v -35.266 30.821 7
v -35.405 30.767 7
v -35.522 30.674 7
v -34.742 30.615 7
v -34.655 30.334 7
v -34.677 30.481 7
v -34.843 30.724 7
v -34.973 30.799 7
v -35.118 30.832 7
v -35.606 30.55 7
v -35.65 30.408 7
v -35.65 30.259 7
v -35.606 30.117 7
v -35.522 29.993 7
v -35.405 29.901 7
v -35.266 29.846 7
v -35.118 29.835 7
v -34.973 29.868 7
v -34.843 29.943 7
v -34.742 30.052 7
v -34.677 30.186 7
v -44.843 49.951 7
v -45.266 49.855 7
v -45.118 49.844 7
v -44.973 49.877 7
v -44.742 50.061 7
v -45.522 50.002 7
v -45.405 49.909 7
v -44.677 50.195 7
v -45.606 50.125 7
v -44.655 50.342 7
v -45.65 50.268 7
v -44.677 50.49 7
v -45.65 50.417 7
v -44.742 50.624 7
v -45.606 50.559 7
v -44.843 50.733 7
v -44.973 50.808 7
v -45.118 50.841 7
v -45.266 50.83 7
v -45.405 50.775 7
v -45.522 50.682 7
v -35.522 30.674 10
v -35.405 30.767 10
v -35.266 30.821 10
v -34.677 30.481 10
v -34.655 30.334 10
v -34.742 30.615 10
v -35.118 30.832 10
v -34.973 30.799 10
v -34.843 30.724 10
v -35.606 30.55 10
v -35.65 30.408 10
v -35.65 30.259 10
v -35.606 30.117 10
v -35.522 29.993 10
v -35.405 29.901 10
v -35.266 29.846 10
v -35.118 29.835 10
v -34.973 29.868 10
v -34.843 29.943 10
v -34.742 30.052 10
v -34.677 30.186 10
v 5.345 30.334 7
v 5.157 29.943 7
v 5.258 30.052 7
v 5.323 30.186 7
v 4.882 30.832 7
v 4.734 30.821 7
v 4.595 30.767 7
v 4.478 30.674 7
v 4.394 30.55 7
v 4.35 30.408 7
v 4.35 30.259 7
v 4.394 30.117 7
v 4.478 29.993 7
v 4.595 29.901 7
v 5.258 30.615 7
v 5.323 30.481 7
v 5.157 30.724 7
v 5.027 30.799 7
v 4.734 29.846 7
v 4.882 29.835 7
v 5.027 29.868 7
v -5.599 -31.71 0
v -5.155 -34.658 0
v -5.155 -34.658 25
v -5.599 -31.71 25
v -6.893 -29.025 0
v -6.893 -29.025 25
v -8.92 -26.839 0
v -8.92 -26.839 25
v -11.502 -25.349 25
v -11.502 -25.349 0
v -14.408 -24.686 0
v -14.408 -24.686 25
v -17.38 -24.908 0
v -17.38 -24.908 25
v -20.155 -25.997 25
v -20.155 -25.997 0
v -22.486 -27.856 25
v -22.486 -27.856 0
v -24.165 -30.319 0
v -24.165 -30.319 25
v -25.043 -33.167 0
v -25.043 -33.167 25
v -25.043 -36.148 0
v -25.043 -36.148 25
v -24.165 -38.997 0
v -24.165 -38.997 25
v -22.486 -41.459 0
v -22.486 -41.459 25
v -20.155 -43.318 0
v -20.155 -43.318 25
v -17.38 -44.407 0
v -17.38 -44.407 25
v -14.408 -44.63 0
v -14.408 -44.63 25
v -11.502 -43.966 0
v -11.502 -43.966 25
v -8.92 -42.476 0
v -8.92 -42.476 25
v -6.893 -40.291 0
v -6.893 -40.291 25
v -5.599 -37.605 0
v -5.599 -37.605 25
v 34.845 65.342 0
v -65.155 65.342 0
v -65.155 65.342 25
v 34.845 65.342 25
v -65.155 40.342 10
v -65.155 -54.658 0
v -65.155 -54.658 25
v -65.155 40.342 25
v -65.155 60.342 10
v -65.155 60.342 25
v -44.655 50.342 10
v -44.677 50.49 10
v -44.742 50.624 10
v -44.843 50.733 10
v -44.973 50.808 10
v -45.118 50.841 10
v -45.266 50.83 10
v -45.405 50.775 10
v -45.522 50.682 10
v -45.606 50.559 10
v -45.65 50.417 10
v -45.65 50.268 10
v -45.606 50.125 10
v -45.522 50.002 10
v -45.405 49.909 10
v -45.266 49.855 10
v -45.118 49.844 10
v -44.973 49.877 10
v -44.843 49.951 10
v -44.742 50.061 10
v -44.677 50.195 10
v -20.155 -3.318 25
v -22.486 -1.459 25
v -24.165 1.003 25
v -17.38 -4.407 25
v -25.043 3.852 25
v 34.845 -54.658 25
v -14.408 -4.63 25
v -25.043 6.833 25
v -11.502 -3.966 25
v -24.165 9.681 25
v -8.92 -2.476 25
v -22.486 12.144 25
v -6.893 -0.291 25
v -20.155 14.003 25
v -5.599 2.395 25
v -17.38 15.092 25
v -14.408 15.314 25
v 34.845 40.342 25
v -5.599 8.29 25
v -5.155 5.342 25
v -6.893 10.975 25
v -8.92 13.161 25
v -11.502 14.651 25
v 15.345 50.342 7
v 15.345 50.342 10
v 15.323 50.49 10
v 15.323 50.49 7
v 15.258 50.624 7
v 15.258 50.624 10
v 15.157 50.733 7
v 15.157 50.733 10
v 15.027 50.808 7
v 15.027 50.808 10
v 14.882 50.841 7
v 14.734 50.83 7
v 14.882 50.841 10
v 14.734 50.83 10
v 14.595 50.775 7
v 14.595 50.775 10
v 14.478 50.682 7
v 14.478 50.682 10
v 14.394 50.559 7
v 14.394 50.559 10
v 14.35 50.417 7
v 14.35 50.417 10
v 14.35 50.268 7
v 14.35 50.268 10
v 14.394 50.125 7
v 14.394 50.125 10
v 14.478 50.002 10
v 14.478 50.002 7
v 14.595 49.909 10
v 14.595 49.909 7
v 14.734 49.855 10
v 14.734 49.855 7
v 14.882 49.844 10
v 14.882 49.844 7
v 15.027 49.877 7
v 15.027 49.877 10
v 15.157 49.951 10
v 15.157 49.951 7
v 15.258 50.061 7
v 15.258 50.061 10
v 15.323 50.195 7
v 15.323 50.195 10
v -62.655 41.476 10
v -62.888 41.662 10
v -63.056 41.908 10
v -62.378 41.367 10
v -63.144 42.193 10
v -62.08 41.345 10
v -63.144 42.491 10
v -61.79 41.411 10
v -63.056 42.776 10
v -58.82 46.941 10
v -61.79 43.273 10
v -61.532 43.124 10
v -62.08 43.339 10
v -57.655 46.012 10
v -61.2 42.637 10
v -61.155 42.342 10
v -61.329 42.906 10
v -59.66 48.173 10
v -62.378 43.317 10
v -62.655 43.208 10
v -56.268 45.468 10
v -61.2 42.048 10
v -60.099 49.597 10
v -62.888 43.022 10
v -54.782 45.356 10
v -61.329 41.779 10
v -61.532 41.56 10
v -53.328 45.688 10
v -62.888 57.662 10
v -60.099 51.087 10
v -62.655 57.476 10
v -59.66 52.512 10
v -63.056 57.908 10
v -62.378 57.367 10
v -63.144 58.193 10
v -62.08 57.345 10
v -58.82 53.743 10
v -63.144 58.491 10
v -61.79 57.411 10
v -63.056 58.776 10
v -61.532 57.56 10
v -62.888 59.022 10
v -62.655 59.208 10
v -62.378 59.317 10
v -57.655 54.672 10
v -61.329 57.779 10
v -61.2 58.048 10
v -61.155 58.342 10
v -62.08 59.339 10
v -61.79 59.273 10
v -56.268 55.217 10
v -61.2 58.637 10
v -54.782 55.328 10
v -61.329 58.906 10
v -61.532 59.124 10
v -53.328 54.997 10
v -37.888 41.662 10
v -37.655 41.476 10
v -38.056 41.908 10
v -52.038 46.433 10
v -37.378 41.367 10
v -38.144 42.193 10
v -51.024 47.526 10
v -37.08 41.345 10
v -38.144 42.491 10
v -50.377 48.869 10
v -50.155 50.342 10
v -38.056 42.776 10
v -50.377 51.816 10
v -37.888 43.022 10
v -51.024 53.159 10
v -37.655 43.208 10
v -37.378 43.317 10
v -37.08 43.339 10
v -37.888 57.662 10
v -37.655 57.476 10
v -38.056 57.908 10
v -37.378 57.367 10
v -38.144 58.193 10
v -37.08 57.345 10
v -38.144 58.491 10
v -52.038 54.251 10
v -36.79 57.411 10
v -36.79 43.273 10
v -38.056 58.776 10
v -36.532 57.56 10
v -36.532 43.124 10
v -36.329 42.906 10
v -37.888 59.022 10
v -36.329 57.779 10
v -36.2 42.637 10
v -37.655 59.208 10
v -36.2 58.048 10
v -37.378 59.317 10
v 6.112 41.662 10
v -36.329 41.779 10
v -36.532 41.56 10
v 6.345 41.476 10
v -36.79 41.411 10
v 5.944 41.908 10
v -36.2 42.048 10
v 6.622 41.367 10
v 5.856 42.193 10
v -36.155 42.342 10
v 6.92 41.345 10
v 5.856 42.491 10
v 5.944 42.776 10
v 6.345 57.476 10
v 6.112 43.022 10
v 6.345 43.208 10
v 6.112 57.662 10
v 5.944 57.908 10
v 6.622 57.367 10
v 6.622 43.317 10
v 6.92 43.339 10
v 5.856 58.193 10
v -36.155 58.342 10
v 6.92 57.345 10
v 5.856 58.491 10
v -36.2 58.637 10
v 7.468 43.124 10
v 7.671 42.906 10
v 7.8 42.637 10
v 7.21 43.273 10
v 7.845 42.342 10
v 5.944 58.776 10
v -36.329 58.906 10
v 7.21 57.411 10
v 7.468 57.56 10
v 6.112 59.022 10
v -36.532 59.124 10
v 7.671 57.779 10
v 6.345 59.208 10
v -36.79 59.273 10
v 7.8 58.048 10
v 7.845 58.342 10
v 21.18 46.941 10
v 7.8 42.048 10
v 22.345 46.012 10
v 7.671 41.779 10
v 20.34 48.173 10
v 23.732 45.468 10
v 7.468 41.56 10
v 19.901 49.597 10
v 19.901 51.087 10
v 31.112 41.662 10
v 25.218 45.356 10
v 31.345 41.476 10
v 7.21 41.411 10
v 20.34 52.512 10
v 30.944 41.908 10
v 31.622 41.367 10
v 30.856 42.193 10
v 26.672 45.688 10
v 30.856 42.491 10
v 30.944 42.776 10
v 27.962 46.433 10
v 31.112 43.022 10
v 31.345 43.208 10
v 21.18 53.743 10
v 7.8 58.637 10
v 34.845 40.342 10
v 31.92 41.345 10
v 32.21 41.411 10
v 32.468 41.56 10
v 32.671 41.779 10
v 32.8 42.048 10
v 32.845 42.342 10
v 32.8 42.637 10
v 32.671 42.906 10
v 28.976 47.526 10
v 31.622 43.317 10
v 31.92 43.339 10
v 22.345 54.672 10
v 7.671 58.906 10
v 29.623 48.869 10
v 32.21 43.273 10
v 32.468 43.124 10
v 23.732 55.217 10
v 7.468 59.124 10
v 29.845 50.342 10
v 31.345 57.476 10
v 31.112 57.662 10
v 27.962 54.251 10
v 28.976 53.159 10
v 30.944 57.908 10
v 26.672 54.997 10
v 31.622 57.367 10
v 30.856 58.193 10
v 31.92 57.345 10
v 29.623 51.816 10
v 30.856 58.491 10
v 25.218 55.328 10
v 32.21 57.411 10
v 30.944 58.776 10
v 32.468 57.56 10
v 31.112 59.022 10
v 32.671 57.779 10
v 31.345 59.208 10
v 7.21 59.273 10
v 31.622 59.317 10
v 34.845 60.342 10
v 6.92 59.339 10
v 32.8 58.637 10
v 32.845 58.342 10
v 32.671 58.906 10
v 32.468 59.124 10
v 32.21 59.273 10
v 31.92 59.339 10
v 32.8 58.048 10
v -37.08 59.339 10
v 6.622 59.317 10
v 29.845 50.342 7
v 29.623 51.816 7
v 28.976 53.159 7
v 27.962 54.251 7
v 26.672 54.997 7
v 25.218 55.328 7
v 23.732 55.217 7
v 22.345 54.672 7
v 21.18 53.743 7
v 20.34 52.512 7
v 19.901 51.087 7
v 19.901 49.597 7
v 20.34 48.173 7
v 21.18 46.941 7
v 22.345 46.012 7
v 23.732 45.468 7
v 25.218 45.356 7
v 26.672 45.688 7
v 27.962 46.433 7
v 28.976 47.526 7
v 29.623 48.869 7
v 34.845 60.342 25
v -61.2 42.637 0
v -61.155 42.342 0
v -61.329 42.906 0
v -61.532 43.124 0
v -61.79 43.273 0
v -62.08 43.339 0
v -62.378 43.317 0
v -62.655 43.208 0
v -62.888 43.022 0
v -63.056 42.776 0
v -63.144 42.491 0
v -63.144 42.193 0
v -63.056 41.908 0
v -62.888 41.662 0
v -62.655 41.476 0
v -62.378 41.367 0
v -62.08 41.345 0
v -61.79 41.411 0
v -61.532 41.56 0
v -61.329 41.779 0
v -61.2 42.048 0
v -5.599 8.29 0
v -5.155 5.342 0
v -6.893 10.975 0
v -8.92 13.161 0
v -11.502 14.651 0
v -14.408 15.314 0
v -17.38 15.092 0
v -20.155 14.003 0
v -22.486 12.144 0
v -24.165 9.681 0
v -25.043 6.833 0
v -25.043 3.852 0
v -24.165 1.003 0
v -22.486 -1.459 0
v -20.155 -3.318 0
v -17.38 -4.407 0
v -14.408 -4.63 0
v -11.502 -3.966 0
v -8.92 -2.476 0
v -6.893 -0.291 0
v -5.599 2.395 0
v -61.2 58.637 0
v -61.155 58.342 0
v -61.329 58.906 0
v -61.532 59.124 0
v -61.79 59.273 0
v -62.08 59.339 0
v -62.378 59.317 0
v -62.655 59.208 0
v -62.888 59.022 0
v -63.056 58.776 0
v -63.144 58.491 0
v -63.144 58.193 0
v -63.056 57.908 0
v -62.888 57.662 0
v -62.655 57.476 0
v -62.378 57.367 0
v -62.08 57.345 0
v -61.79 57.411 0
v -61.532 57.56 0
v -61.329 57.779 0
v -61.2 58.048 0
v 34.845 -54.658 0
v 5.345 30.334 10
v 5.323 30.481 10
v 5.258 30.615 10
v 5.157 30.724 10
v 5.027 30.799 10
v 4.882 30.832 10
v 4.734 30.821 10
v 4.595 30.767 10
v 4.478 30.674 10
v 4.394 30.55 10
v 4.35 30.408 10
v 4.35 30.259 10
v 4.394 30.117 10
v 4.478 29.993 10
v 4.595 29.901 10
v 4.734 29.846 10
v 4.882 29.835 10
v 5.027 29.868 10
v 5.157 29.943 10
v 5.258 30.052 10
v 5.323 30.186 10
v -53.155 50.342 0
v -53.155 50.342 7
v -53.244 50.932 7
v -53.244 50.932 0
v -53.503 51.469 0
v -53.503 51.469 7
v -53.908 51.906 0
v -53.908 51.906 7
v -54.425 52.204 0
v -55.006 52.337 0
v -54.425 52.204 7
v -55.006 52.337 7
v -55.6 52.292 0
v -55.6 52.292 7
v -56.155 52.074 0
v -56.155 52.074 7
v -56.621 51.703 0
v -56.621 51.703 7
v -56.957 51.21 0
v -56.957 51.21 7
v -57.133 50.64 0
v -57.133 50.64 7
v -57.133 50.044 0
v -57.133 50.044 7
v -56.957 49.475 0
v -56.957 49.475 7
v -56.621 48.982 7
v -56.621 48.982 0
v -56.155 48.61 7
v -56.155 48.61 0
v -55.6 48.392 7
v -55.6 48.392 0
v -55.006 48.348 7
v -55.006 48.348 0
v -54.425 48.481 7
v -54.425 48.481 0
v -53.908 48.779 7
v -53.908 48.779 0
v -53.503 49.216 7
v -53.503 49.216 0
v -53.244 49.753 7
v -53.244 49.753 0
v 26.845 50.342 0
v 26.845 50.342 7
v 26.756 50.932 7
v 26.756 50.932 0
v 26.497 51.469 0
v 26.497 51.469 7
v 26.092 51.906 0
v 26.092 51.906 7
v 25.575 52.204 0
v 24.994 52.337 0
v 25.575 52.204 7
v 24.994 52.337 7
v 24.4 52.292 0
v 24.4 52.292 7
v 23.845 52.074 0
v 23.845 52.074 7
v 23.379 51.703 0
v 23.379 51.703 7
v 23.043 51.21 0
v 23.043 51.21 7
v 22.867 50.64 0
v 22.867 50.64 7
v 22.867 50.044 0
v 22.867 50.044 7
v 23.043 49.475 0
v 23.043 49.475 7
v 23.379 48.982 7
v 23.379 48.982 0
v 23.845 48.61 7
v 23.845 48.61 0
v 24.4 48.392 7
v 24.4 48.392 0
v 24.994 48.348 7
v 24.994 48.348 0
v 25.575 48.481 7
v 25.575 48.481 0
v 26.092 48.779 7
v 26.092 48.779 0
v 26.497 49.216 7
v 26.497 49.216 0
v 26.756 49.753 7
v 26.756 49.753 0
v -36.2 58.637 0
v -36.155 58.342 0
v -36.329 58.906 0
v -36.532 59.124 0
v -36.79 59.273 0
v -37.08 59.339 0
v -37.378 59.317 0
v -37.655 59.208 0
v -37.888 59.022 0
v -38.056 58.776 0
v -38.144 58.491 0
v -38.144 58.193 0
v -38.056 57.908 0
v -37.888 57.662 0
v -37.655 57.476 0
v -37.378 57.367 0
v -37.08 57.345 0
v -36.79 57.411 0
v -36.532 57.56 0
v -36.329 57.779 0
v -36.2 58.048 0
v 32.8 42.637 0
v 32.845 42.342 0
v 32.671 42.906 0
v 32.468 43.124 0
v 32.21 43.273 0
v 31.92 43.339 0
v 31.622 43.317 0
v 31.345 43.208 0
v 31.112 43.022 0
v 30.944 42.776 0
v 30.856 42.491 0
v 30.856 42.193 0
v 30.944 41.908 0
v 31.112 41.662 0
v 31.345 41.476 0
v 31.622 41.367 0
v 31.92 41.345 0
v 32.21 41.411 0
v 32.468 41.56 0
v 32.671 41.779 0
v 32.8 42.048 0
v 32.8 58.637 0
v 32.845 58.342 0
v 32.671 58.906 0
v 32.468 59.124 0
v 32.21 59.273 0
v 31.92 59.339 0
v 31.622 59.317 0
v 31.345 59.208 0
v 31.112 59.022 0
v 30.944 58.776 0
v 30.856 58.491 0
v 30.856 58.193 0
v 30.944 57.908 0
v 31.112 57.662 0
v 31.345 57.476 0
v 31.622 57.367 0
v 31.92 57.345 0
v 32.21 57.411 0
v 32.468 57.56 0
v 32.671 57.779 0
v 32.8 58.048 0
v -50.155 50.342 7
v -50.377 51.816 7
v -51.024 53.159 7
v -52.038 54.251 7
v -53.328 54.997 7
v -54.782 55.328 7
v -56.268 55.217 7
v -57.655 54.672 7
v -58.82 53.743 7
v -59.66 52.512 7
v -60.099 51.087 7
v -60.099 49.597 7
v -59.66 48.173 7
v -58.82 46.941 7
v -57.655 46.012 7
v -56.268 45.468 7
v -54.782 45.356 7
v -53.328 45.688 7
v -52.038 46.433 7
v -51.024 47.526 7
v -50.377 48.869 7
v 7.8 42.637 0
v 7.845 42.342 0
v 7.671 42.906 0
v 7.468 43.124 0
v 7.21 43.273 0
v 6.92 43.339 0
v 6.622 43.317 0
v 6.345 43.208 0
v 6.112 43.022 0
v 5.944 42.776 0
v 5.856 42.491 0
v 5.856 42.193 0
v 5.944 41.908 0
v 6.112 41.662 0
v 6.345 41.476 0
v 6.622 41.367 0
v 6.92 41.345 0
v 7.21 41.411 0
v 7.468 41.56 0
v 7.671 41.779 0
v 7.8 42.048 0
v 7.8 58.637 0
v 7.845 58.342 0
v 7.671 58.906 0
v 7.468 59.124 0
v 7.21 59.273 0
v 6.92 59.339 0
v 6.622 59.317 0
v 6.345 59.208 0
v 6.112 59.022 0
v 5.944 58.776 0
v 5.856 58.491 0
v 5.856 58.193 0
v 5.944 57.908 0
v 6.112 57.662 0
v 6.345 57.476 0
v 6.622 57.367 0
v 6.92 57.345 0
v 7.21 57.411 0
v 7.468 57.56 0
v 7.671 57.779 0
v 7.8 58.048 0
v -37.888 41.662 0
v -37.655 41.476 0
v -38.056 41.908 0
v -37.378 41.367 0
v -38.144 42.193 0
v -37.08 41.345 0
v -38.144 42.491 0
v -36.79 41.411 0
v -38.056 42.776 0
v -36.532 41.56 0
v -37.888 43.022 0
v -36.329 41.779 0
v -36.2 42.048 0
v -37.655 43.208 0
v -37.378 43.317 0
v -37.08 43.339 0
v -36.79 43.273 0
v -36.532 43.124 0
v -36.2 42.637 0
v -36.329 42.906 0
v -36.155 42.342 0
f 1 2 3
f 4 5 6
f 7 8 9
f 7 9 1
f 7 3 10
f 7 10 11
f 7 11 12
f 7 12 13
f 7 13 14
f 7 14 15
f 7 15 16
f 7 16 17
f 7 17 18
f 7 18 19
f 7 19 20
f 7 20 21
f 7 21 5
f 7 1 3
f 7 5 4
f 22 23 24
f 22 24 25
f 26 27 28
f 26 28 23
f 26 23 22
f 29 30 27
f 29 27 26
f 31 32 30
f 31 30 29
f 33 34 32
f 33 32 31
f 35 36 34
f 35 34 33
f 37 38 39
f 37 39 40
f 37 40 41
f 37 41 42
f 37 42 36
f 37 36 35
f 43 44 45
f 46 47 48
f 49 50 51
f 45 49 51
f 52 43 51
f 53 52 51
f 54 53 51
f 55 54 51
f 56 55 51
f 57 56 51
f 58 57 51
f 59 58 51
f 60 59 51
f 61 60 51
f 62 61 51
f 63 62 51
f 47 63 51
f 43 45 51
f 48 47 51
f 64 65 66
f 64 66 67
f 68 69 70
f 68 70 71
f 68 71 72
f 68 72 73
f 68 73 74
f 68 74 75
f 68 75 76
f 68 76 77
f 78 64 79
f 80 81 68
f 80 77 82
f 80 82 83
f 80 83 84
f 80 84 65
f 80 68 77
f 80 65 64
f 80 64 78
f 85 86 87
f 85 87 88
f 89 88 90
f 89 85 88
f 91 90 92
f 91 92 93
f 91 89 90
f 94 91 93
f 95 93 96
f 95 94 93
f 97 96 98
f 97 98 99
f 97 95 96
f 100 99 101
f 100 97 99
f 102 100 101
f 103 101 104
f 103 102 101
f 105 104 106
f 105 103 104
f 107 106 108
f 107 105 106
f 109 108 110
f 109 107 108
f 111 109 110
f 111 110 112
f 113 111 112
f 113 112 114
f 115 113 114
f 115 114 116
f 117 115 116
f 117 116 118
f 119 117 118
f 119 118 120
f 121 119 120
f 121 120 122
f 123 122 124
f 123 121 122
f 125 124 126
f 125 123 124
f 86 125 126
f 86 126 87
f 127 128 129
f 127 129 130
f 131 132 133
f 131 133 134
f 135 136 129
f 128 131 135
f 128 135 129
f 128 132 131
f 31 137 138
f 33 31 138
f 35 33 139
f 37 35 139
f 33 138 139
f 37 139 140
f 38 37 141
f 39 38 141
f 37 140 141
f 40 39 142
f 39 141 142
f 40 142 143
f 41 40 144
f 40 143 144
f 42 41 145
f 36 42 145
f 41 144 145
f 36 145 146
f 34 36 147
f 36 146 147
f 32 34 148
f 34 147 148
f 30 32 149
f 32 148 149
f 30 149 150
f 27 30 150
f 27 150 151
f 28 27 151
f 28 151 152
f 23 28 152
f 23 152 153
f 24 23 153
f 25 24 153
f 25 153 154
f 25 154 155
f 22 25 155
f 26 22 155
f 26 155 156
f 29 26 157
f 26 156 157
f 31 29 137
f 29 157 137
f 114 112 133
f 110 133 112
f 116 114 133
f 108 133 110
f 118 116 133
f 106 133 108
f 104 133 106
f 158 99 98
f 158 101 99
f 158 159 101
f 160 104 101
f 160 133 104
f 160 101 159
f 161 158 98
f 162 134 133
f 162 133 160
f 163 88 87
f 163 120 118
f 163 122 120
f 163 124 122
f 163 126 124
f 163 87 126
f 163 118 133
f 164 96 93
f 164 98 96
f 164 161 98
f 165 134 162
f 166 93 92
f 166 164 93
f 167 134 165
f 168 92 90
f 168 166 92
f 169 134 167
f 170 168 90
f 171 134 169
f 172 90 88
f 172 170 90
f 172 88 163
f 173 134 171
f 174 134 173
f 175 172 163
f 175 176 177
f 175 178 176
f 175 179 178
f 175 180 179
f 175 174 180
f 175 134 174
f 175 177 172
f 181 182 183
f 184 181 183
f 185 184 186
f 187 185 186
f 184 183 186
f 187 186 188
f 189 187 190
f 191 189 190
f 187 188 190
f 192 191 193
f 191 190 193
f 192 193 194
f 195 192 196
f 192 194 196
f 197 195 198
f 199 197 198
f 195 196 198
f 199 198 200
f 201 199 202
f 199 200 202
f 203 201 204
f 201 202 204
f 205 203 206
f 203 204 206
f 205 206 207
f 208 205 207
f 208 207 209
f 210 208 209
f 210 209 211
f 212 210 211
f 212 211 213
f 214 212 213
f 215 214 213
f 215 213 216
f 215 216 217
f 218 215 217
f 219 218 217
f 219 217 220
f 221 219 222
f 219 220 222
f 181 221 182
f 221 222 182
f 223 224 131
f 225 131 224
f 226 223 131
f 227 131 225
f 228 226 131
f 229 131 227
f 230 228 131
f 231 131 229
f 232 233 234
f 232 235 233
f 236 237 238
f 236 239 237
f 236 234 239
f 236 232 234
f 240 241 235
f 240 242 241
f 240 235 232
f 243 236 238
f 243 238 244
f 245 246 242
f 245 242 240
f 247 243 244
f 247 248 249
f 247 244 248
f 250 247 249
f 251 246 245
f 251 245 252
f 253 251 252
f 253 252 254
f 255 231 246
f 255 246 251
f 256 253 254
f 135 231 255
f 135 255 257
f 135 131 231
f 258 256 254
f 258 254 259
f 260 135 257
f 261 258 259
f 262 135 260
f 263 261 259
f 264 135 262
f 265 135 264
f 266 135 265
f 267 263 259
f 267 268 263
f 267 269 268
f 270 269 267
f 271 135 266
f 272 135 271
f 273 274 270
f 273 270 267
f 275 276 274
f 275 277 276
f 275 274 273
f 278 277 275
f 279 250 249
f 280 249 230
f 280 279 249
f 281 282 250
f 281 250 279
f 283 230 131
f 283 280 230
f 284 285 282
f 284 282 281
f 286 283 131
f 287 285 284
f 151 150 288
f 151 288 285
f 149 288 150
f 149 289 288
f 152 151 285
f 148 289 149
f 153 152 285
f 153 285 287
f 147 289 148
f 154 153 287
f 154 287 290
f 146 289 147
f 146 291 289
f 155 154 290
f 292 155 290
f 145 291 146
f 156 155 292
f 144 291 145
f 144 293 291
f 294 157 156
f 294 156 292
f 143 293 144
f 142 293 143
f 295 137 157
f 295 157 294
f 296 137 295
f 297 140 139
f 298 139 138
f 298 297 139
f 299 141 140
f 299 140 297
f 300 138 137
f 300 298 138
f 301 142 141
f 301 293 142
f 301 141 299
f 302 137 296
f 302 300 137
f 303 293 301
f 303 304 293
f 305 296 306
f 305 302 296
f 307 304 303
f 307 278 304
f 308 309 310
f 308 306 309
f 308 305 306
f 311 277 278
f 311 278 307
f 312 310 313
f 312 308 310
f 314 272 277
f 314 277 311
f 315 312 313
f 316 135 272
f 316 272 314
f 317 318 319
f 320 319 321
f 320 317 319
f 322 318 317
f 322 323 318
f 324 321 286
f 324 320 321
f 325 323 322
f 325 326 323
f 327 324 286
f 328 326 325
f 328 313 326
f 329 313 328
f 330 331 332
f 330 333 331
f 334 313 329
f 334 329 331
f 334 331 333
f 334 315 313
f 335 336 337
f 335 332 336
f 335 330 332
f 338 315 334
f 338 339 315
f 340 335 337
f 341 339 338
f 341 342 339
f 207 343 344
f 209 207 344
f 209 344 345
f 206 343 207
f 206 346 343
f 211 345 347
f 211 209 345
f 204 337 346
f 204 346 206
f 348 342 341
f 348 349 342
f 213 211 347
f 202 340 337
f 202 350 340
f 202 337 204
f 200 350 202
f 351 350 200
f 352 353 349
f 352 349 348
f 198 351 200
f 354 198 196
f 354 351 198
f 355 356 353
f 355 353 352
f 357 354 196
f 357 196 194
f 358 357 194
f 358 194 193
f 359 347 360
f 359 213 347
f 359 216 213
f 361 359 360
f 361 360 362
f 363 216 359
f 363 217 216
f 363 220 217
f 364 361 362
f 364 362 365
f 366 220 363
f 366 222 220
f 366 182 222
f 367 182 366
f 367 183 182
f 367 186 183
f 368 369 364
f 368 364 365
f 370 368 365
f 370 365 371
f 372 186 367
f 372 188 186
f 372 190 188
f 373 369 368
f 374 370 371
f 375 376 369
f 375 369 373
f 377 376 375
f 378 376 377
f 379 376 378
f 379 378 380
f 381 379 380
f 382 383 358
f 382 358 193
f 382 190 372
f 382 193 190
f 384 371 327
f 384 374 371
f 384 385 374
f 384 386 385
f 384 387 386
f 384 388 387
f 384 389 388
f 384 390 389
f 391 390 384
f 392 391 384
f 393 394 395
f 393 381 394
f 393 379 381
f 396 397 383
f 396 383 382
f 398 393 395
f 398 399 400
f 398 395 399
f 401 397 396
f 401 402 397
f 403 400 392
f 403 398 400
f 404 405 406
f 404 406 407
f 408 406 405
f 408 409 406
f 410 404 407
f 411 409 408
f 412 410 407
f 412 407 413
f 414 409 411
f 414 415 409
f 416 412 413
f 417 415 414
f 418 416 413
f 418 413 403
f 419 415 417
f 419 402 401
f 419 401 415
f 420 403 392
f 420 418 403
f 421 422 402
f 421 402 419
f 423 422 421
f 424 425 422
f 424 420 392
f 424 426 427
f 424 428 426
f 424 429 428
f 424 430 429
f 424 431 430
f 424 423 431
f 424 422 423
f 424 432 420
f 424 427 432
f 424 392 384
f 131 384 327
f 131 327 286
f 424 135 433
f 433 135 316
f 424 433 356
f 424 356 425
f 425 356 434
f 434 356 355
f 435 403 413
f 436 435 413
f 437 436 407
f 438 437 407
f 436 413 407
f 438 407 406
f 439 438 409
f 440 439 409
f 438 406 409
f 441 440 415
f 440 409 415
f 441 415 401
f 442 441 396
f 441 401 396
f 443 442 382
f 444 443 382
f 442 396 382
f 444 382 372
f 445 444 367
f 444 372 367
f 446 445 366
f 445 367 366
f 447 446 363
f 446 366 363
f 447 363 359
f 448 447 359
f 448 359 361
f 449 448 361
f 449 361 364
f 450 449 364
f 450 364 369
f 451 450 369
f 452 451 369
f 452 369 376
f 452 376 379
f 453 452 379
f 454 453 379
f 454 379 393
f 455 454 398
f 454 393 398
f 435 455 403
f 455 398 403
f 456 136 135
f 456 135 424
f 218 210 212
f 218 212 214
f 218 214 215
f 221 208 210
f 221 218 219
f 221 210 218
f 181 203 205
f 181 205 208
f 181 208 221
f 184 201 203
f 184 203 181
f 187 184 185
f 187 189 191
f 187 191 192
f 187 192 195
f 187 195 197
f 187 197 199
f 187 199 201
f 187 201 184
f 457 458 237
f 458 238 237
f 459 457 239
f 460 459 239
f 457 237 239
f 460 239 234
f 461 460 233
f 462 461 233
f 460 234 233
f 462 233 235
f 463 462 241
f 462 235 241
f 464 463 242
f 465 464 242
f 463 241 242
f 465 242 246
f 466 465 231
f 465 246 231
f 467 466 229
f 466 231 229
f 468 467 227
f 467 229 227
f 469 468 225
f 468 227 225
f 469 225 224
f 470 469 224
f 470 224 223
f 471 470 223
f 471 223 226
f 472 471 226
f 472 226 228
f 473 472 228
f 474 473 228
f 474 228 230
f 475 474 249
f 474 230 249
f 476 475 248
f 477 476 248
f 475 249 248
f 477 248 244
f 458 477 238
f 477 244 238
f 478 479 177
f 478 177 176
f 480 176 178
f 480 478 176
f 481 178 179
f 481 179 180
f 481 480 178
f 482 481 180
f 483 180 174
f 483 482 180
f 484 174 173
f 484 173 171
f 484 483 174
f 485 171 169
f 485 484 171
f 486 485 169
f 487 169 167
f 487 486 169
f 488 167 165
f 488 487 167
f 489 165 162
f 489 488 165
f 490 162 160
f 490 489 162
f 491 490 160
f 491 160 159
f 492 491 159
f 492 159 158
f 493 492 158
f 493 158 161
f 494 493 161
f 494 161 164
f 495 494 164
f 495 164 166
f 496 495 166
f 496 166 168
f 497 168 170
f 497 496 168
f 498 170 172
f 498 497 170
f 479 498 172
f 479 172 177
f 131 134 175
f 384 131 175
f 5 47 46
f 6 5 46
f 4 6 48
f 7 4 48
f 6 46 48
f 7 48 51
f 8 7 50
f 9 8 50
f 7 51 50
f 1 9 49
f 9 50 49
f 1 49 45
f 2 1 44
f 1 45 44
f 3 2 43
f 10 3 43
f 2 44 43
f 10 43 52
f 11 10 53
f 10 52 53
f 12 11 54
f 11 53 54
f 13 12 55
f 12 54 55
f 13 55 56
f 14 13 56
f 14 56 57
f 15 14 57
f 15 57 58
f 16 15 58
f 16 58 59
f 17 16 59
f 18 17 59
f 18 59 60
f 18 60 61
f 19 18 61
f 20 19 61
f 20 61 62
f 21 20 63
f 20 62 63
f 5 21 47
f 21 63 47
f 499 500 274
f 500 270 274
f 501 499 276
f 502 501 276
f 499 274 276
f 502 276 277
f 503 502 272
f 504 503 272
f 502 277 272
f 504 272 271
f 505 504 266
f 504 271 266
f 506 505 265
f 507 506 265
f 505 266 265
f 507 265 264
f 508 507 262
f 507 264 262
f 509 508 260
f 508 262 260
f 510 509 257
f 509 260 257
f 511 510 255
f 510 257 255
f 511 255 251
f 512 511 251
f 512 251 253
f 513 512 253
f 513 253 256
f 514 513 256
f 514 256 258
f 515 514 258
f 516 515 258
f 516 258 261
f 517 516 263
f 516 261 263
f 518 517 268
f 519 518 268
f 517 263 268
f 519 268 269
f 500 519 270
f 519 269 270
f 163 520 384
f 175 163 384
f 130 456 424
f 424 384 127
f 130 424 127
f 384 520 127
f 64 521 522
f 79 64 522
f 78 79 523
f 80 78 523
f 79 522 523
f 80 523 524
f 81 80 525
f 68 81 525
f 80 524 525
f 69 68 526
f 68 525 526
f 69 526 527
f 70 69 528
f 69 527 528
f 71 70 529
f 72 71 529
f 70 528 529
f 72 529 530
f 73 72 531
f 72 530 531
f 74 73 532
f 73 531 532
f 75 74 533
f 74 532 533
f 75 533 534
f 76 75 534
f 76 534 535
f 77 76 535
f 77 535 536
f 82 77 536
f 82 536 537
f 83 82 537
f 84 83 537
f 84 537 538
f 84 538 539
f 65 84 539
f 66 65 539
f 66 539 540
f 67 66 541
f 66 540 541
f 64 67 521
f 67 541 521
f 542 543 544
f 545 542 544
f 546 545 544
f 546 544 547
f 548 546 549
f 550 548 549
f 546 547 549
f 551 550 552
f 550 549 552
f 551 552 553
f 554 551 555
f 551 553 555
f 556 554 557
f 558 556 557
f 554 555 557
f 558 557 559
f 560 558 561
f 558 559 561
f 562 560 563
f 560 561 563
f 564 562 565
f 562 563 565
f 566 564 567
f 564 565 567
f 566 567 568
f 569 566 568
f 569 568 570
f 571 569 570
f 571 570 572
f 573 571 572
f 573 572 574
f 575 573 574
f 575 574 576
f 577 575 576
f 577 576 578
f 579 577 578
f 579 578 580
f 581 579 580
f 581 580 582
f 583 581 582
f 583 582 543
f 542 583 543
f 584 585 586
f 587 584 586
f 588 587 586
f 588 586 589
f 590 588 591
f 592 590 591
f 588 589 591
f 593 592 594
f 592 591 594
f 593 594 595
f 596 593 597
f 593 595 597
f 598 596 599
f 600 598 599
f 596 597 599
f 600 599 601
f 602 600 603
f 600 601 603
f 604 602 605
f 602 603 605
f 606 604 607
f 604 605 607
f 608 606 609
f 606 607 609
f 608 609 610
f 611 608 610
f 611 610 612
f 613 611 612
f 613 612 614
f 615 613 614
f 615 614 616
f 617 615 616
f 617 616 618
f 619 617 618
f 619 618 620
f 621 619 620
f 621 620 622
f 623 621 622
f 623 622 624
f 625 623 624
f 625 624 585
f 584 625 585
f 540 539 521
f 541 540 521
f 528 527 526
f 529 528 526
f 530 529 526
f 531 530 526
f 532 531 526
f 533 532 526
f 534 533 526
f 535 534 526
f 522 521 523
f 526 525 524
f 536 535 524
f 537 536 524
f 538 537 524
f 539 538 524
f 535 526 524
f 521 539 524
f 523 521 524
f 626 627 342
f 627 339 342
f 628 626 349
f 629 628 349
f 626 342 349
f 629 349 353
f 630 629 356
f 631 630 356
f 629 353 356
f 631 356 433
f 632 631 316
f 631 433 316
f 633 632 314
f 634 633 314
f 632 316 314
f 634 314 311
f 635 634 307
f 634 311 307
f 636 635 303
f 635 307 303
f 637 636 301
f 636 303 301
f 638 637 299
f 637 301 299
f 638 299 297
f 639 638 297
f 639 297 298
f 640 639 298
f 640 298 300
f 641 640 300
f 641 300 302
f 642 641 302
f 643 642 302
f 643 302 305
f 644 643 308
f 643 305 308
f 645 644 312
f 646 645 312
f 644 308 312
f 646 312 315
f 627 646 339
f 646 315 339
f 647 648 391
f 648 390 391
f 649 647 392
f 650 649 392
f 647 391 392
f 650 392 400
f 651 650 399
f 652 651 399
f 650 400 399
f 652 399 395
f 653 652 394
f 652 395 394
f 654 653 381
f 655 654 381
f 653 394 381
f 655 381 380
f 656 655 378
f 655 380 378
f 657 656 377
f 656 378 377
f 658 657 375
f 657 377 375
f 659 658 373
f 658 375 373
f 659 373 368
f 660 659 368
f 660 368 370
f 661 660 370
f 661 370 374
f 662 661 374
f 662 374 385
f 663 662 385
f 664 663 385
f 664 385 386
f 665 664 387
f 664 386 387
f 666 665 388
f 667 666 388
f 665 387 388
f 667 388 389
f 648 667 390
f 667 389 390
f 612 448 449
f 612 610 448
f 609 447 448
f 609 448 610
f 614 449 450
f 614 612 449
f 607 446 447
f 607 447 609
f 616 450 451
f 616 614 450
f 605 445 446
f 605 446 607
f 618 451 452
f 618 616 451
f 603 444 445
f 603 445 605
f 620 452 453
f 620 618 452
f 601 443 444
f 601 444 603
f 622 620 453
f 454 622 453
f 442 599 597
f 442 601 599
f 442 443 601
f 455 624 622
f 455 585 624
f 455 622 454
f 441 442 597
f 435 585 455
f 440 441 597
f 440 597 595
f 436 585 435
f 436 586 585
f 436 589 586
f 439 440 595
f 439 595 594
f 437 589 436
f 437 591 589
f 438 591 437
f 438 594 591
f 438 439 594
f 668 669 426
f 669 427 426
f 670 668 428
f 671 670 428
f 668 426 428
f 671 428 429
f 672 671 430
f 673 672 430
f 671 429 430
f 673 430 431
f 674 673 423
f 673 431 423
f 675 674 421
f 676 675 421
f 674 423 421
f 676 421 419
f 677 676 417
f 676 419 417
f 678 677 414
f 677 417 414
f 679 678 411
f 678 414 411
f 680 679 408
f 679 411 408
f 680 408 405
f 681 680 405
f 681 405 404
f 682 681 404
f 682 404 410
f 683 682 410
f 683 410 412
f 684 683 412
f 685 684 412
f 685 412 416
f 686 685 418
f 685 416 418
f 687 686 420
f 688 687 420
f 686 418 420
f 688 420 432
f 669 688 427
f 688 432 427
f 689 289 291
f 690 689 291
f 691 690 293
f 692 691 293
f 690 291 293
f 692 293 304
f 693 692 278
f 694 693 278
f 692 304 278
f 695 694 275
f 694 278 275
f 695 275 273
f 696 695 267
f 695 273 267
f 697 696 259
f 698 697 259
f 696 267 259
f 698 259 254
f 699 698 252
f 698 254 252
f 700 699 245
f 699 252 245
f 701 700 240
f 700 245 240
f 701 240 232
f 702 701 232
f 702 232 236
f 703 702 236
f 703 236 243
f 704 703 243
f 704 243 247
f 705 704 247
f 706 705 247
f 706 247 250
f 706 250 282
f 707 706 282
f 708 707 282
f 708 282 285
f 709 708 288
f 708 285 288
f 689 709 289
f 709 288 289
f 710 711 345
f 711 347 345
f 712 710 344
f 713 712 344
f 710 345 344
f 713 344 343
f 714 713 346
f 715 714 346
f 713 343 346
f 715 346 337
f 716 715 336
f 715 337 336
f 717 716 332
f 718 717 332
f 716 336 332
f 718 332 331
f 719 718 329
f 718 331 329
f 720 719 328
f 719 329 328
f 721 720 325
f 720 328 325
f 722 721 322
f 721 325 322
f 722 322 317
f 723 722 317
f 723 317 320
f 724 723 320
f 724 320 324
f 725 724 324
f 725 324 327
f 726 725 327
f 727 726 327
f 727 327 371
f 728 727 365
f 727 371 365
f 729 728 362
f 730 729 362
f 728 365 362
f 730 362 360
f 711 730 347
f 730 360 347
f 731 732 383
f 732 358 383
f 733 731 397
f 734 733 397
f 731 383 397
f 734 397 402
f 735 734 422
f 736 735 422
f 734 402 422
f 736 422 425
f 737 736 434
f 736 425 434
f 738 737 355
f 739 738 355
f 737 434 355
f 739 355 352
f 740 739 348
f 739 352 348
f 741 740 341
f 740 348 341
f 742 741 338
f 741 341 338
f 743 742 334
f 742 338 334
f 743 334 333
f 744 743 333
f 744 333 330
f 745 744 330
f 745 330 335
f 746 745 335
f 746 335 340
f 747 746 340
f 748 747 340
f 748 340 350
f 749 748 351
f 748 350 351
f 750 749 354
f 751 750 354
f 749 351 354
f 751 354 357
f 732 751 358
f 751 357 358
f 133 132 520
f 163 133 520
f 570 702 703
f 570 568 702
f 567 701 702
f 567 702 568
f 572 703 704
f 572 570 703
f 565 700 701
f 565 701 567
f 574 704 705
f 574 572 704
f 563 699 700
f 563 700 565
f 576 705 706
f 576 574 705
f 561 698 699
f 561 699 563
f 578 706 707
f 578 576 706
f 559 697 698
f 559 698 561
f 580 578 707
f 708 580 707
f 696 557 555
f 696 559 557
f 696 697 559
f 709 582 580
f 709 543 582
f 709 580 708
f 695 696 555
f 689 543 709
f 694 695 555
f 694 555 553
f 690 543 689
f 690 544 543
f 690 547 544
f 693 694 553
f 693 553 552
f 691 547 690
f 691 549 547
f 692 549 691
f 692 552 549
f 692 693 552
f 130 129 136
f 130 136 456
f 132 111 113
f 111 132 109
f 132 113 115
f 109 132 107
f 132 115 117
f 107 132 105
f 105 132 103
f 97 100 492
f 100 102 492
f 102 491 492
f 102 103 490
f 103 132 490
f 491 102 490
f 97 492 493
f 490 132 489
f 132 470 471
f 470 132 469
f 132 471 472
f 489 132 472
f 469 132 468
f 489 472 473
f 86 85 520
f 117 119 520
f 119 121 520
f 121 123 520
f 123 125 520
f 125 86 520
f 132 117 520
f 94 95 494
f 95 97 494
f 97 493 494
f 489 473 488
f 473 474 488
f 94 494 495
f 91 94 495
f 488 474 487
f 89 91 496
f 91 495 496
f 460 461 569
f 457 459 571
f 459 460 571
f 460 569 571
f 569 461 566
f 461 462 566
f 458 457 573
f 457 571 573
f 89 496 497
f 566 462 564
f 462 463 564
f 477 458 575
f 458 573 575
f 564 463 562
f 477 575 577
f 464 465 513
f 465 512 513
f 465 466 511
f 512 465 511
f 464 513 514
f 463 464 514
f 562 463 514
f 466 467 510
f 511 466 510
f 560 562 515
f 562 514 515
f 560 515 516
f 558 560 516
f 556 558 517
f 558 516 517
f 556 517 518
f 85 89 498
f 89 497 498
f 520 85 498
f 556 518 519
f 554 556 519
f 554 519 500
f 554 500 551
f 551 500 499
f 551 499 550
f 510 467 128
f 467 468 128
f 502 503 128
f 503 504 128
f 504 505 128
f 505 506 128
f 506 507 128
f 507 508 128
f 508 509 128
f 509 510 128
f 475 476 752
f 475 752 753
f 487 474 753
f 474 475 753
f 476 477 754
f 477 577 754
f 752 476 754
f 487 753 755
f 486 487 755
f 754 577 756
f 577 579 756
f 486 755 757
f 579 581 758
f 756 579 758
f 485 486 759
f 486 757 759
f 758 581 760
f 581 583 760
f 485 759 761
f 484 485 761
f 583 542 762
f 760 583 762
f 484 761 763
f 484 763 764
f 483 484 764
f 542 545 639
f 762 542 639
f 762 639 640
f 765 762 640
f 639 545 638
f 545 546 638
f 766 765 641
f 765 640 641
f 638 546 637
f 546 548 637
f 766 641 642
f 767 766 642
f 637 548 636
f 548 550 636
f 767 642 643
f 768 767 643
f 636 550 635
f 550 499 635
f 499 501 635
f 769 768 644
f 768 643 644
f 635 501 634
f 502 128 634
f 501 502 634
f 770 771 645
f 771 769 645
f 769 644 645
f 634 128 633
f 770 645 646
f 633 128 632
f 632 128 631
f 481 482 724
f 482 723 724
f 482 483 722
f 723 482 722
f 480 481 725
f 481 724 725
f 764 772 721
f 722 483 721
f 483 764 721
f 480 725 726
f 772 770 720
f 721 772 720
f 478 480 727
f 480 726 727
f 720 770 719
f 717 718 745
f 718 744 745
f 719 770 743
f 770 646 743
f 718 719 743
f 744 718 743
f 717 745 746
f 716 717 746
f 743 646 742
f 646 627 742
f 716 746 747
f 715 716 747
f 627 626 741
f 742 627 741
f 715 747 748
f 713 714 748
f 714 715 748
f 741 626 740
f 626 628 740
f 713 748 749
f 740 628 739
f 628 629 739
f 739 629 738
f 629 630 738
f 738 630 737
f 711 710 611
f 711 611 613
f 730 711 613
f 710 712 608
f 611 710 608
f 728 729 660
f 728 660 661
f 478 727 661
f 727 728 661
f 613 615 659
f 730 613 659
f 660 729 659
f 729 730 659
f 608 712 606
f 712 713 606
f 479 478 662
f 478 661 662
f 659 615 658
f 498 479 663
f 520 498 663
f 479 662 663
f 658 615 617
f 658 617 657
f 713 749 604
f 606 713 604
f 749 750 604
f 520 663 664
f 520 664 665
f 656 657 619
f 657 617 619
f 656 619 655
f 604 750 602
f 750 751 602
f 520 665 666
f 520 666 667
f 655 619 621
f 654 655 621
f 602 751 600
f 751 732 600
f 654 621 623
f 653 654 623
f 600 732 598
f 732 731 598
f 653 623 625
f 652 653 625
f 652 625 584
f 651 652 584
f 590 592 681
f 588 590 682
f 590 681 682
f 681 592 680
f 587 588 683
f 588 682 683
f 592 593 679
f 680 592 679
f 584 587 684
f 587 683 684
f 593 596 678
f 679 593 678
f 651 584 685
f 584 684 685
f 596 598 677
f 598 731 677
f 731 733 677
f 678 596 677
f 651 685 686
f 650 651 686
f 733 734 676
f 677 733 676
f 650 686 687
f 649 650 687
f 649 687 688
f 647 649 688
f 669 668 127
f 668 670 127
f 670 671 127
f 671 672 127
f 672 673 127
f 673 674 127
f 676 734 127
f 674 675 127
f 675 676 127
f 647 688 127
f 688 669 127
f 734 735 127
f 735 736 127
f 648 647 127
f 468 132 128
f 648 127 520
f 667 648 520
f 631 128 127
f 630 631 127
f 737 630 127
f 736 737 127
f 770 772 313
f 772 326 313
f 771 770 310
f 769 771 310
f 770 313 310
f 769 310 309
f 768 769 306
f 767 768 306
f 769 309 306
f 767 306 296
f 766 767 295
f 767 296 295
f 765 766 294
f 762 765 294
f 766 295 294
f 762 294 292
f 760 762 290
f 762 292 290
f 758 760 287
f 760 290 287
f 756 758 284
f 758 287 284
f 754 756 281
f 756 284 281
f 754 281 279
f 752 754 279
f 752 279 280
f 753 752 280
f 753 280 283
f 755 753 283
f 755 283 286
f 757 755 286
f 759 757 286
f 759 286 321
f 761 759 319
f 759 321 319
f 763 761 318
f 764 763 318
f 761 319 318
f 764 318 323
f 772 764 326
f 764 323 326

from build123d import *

# Parameters (mm, degrees)
F0_W     = 100
F0_H     = 120
F0_R     = 10
F1_DEPTH = 25
F2_W     = 100
F2_H     = 20
F3_DEPTH = 15
F4_R     = 1
F4_R_2   = 5
F4_R_3   = 0.5
F5_DEPTH = 3
F6_R     = 2
F6_R_2   = 1
F7_DEPTH = 25


with BuildPart() as f1:
    # F0 (on Top) → F1 (new body)
    with BuildSketch(Plane.XY):
        with Locations((-15.155184, 5.342288)):
            Rectangle(F0_W, F0_H)
        with Locations((-15.155184, -34.657712)):
            Circle(F0_R, mode=Mode.SUBTRACT)
        with Locations((-15.155184, 5.342288)):
            Circle(F0_R, mode=Mode.SUBTRACT)
    extrude(amount=F1_DEPTH)

    # F2 (on face) → F3 (cut)
    with BuildSketch(Plane.XY.offset(25)):
        with Locations((-15.155184, 50.342288)):
            Rectangle(F2_W, F2_H)
    extrude(amount=-F3_DEPTH, mode=Mode.SUBTRACT)

    # F4 (on face) → F5 (cut)
    with BuildSketch(Plane.XY.offset(10)):
        with Locations((-62.155184, 58.342288)):
            Circle(F4_R)
        with Locations((-37.155184, 58.342288)):
            Circle(F4_R)
        with Locations((-55.155184, 50.342288)):
            Circle(F4_R_2)
        with Locations((-45.155184, 50.342288)):
            Circle(F4_R_3)
        with Locations((-35.155184, 30.333549)):
            Circle(F4_R_3)
        with Locations((-62.155184, 42.342288)):
            Circle(F4_R)
        with Locations((-37.155184, 42.342288)):
            Circle(F4_R)
        with Locations((31.844816, 58.342288)):
            Circle(F4_R)
        with Locations((6.844816, 58.342288)):
            Circle(F4_R)
        with Locations((24.844816, 50.342288)):
            Circle(F4_R_2)
        with Locations((31.844816, 42.342288)):
            Circle(F4_R)
        with Locations((6.844816, 42.342288)):
            Circle(F4_R)
        with Locations((14.844816, 50.342288)):
            Circle(F4_R_3)
        with Locations((4.844816, 30.333549)):
            Circle(F4_R_3)
    extrude(amount=-F5_DEPTH, mode=Mode.SUBTRACT)

    # F6 (on face) → F7 (cut)
    with BuildSketch(Plane.XY.offset(10)):
        with Locations((24.844816, 50.342288)):
            Circle(F6_R)
        with Locations((31.844816, 42.342288)):
            Circle(F6_R_2)
        with Locations((31.844816, 58.342288)):
            Circle(F6_R_2)
        with Locations((6.844816, 42.342288)):
            Circle(F6_R_2)
        with Locations((-37.155184, 42.342288)):
            Circle(F6_R_2)
        with Locations((-62.155184, 42.342288)):
            Circle(F6_R_2)
        with Locations((6.844816, 58.342288)):
            Circle(F6_R_2)
        with Locations((-37.155184, 58.342288)):
            Circle(F6_R_2)
        with Locations((-55.155184, 50.342288)):
            Circle(F6_R)
        with Locations((-62.155184, 58.342288)):
            Circle(F6_R_2)
    extrude(amount=-F7_DEPTH, mode=Mode.SUBTRACT)


solid = f1.part
